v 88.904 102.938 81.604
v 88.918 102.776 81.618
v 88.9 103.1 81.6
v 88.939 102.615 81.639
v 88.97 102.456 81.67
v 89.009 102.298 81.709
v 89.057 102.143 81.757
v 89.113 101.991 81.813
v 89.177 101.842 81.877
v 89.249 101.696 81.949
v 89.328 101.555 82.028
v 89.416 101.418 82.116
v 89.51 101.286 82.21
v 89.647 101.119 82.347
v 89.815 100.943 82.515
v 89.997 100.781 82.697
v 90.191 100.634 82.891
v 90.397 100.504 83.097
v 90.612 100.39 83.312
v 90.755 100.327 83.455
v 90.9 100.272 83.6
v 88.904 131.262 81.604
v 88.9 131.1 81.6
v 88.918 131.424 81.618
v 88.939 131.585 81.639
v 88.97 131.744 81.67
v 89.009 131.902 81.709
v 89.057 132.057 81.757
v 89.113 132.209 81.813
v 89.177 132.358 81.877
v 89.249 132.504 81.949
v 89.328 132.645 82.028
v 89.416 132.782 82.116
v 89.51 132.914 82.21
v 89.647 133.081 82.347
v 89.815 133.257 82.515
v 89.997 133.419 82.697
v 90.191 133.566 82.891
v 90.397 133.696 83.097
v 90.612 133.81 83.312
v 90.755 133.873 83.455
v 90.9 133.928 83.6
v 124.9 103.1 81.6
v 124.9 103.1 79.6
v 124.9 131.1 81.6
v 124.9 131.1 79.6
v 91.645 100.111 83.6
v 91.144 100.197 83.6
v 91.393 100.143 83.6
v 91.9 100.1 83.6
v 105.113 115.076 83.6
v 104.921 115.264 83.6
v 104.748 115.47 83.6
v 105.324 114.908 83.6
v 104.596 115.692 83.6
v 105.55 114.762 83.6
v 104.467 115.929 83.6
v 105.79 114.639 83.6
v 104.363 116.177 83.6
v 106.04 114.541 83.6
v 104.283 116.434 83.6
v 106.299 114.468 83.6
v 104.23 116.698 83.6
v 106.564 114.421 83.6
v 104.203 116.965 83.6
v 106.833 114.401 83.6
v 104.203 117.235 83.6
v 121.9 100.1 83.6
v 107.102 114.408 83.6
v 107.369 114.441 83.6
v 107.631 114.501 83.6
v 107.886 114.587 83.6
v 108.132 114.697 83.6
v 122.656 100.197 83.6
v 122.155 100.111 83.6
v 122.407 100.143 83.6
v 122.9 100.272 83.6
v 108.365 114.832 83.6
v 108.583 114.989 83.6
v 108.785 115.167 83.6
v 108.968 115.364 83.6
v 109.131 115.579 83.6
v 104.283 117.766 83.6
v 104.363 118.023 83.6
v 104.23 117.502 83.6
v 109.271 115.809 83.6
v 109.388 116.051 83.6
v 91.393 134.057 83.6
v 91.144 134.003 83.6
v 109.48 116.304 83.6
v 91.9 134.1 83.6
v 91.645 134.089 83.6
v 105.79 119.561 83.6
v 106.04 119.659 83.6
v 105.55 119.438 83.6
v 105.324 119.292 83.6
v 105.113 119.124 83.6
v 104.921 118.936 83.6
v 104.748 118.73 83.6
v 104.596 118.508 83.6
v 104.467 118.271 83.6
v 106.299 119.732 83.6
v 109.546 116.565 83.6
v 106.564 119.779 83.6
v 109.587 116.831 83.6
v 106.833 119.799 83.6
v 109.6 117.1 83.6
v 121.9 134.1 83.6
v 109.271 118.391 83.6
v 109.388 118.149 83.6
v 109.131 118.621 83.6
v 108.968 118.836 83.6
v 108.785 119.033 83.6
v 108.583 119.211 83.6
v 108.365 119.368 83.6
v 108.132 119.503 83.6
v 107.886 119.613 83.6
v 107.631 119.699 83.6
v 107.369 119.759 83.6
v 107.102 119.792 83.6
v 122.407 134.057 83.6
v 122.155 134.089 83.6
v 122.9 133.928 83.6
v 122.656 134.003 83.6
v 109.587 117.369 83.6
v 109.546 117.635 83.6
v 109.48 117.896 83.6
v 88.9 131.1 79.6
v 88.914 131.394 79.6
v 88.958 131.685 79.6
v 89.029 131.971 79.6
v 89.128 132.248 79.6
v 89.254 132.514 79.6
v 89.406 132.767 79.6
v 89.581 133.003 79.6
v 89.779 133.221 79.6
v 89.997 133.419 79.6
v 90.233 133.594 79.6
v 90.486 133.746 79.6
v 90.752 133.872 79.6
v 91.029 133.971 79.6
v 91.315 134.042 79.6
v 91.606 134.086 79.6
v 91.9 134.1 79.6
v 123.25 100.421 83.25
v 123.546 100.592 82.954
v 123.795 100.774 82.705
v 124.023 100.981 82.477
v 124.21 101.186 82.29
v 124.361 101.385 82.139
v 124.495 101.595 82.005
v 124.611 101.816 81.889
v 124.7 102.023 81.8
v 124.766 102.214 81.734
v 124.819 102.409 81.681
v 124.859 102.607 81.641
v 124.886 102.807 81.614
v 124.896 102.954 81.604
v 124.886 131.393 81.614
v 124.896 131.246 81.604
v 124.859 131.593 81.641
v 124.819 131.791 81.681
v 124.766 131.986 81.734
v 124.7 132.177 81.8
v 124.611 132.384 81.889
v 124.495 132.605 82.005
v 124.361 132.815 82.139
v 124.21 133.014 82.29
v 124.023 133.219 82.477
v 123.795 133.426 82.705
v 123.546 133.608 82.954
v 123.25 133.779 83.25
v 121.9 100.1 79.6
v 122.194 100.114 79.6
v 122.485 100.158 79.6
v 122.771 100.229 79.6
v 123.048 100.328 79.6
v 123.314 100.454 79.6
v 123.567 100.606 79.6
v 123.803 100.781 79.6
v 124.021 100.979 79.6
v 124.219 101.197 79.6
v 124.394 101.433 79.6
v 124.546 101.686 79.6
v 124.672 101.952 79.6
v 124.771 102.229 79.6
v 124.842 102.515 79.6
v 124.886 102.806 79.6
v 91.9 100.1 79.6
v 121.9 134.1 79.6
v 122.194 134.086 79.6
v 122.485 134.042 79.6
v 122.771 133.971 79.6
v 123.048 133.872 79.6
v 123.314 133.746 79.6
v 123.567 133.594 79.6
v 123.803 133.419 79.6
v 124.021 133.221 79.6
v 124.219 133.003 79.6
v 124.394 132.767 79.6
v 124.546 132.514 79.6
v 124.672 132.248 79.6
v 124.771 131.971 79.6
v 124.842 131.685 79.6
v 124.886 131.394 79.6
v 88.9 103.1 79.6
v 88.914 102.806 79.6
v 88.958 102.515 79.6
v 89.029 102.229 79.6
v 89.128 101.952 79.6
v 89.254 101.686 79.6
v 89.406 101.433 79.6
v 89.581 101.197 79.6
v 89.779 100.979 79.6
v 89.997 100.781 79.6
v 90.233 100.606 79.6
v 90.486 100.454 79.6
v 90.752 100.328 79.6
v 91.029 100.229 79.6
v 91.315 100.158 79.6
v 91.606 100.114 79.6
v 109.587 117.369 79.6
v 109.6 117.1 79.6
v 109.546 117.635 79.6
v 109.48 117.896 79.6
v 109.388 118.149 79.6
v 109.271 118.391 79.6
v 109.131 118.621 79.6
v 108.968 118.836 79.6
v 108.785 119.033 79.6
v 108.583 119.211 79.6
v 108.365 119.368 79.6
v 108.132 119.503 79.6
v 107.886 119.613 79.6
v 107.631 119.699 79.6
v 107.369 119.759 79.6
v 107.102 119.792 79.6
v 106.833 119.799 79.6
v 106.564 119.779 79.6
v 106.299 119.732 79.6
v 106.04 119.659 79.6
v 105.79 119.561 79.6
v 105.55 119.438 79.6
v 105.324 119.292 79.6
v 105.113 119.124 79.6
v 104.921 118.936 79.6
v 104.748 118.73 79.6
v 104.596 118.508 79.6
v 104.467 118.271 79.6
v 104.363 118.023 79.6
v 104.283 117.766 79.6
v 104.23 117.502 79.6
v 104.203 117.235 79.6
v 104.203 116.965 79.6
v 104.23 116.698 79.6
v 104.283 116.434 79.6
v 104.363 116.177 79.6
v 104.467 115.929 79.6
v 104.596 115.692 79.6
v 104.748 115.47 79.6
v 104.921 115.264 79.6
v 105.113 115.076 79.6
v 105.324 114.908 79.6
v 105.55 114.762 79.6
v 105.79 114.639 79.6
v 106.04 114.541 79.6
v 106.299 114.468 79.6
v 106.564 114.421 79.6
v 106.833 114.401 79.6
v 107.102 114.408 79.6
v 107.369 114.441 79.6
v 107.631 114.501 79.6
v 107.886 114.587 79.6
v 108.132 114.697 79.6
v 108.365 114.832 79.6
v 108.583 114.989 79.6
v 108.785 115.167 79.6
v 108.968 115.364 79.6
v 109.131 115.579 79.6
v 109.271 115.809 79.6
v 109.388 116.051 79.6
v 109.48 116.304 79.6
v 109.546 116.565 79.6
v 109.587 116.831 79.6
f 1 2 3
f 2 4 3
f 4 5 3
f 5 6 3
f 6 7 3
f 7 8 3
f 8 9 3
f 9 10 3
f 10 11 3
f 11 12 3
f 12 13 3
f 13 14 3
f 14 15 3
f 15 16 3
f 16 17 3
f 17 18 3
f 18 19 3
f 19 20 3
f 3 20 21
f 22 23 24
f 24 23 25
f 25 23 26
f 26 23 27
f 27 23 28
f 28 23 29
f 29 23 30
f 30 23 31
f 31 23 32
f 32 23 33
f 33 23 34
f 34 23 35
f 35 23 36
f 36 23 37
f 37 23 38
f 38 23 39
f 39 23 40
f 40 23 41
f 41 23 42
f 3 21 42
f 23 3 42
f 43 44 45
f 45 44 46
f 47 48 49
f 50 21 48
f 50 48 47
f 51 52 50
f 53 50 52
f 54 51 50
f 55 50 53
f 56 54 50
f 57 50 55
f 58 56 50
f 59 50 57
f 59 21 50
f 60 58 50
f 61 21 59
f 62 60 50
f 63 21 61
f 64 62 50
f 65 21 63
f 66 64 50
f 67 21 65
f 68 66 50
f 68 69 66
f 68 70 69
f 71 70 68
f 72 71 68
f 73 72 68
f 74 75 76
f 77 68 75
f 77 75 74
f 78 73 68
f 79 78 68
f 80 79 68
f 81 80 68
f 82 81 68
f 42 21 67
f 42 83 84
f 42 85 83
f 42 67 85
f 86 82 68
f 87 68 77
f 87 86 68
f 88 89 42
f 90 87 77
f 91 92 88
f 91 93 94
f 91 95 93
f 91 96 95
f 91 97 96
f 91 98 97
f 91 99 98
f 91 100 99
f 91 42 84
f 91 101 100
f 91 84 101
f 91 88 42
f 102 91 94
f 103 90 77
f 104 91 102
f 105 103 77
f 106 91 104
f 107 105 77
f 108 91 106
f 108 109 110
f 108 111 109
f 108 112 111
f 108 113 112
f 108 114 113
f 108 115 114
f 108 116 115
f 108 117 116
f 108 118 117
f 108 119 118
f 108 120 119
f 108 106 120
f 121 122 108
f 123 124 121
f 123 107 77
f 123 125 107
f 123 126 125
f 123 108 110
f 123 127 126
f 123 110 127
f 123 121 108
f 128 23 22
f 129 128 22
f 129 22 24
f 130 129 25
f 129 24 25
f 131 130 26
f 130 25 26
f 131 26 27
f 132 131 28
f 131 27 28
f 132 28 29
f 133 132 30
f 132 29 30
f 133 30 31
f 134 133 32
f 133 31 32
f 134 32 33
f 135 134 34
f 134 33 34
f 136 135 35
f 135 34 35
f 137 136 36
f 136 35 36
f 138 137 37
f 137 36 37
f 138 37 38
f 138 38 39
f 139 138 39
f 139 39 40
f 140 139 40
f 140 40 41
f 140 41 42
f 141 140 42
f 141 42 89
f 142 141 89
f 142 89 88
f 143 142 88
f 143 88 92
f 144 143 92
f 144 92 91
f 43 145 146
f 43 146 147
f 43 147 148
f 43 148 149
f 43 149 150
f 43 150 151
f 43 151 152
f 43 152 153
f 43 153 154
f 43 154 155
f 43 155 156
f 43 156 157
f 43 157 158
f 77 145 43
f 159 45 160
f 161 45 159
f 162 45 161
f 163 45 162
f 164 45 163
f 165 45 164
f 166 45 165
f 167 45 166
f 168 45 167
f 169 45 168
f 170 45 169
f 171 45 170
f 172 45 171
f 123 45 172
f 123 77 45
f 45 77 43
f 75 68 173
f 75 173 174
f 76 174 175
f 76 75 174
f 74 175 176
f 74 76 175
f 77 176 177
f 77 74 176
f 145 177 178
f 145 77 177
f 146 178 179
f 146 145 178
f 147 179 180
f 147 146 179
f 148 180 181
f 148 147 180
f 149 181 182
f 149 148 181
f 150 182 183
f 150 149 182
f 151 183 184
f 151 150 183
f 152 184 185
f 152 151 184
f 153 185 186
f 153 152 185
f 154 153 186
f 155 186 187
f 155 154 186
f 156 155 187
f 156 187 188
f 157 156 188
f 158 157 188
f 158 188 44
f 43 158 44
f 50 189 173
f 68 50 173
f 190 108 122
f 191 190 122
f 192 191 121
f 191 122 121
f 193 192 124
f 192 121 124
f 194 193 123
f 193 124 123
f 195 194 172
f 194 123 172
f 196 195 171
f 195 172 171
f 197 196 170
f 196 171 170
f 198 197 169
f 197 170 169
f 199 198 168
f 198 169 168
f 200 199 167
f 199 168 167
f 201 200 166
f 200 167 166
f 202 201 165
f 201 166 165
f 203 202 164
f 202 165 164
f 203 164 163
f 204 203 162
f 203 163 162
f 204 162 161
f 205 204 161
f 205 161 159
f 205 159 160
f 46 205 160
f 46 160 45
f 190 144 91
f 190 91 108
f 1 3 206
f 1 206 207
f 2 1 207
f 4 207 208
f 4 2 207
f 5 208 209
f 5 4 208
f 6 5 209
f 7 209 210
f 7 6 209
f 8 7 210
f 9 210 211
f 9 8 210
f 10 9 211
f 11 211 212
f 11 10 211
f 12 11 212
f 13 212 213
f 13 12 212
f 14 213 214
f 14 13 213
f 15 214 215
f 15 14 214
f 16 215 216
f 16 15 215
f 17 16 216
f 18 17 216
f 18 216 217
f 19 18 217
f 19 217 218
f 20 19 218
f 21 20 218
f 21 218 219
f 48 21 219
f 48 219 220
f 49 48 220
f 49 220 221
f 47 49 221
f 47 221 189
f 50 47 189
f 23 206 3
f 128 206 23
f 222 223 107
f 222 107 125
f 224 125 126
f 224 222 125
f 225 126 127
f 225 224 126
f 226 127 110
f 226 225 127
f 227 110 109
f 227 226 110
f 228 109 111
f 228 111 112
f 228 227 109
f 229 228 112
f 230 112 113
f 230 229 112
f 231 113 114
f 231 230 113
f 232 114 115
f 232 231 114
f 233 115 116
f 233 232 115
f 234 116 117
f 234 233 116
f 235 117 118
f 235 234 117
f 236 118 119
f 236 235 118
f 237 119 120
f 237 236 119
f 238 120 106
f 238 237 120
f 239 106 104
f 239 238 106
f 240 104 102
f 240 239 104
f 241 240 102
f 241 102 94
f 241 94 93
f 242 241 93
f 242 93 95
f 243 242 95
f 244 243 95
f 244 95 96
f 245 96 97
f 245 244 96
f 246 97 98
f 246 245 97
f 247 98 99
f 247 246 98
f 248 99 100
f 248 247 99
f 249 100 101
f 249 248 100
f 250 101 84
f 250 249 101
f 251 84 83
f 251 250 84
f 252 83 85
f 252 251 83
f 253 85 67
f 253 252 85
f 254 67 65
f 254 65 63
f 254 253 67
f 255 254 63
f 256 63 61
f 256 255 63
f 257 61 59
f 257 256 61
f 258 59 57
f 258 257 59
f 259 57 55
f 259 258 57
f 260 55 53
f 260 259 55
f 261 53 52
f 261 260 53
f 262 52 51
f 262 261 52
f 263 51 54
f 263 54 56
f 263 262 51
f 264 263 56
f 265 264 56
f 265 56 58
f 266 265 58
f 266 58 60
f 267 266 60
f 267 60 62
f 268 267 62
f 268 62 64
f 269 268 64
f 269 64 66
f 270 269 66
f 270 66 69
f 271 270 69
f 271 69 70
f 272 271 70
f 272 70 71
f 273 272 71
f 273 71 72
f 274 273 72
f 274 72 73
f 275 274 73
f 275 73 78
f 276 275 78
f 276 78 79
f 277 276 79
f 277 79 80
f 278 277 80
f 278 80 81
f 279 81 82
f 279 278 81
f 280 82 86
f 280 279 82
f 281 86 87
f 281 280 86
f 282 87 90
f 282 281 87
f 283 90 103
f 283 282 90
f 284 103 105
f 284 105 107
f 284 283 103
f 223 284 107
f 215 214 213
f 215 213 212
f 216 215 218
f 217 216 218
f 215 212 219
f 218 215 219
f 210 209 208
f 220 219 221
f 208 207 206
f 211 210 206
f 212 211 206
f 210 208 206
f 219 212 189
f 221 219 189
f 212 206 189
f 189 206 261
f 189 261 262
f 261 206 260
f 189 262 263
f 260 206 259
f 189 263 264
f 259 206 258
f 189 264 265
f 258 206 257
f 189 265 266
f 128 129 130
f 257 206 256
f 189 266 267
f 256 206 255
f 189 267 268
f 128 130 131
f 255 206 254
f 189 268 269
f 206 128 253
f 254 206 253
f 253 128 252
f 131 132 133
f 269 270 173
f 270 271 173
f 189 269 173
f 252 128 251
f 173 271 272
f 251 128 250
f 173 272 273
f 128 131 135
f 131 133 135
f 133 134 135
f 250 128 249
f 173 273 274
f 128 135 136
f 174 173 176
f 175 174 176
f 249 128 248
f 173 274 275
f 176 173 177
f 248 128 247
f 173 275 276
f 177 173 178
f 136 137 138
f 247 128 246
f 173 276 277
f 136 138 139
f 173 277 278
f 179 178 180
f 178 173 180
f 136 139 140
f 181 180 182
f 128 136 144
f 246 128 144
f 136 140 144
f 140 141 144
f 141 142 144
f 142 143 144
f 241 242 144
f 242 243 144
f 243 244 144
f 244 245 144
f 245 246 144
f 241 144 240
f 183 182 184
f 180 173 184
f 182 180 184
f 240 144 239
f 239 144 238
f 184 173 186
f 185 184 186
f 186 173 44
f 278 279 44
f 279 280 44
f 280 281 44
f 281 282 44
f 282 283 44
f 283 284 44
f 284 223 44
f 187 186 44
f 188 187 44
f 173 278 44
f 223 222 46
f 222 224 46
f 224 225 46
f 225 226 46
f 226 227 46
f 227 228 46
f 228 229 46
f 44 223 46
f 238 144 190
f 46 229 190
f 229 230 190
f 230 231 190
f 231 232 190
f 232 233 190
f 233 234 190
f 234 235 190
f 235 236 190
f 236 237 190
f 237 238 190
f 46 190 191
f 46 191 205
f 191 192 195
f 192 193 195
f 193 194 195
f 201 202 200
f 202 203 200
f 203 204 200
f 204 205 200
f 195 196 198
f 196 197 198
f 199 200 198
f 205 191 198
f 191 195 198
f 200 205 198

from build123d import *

# Parameters (mm, degrees)
SKETCH020_W     = 36
SKETCH020_H     = 34
SKETCH020_R     = 2.7
PAD003_DEPTH    = 4
CHAMFER001_SIZE = 2
FILLET001_R     = 3


with BuildPart() as part:
    # Sketch020 → Pad003 (new body)
    with BuildSketch(Plane.XY):
        Rectangle(SKETCH020_W, SKETCH020_H)
        Circle(SKETCH020_R, mode=Mode.SUBTRACT)
    extrude(amount=PAD003_DEPTH)

    # Chamfer001
    chamfer001_edges = [part.edges().sort_by_distance(p)[0] for p in [
        (18, 0, 4),
        (-18, 0, 4),
    ]]
    chamfer(chamfer001_edges, length=CHAMFER001_SIZE)

    # Fillet001
    fillet001_edges = [part.edges().sort_by_distance(p)[0] for p in [
        (-18, -17, 1),
        (18, -17, 1),
        (-18, 17, 1),
        (18, 17, 1),
    ]]
    fillet(fillet001_edges, radius=FILLET001_R)


with BuildPart() as part_1:
    # Body005 placement: moved
    add(part.part.moved(Location((106.9, 117.1, 79.6))))


solid = part_1.part
